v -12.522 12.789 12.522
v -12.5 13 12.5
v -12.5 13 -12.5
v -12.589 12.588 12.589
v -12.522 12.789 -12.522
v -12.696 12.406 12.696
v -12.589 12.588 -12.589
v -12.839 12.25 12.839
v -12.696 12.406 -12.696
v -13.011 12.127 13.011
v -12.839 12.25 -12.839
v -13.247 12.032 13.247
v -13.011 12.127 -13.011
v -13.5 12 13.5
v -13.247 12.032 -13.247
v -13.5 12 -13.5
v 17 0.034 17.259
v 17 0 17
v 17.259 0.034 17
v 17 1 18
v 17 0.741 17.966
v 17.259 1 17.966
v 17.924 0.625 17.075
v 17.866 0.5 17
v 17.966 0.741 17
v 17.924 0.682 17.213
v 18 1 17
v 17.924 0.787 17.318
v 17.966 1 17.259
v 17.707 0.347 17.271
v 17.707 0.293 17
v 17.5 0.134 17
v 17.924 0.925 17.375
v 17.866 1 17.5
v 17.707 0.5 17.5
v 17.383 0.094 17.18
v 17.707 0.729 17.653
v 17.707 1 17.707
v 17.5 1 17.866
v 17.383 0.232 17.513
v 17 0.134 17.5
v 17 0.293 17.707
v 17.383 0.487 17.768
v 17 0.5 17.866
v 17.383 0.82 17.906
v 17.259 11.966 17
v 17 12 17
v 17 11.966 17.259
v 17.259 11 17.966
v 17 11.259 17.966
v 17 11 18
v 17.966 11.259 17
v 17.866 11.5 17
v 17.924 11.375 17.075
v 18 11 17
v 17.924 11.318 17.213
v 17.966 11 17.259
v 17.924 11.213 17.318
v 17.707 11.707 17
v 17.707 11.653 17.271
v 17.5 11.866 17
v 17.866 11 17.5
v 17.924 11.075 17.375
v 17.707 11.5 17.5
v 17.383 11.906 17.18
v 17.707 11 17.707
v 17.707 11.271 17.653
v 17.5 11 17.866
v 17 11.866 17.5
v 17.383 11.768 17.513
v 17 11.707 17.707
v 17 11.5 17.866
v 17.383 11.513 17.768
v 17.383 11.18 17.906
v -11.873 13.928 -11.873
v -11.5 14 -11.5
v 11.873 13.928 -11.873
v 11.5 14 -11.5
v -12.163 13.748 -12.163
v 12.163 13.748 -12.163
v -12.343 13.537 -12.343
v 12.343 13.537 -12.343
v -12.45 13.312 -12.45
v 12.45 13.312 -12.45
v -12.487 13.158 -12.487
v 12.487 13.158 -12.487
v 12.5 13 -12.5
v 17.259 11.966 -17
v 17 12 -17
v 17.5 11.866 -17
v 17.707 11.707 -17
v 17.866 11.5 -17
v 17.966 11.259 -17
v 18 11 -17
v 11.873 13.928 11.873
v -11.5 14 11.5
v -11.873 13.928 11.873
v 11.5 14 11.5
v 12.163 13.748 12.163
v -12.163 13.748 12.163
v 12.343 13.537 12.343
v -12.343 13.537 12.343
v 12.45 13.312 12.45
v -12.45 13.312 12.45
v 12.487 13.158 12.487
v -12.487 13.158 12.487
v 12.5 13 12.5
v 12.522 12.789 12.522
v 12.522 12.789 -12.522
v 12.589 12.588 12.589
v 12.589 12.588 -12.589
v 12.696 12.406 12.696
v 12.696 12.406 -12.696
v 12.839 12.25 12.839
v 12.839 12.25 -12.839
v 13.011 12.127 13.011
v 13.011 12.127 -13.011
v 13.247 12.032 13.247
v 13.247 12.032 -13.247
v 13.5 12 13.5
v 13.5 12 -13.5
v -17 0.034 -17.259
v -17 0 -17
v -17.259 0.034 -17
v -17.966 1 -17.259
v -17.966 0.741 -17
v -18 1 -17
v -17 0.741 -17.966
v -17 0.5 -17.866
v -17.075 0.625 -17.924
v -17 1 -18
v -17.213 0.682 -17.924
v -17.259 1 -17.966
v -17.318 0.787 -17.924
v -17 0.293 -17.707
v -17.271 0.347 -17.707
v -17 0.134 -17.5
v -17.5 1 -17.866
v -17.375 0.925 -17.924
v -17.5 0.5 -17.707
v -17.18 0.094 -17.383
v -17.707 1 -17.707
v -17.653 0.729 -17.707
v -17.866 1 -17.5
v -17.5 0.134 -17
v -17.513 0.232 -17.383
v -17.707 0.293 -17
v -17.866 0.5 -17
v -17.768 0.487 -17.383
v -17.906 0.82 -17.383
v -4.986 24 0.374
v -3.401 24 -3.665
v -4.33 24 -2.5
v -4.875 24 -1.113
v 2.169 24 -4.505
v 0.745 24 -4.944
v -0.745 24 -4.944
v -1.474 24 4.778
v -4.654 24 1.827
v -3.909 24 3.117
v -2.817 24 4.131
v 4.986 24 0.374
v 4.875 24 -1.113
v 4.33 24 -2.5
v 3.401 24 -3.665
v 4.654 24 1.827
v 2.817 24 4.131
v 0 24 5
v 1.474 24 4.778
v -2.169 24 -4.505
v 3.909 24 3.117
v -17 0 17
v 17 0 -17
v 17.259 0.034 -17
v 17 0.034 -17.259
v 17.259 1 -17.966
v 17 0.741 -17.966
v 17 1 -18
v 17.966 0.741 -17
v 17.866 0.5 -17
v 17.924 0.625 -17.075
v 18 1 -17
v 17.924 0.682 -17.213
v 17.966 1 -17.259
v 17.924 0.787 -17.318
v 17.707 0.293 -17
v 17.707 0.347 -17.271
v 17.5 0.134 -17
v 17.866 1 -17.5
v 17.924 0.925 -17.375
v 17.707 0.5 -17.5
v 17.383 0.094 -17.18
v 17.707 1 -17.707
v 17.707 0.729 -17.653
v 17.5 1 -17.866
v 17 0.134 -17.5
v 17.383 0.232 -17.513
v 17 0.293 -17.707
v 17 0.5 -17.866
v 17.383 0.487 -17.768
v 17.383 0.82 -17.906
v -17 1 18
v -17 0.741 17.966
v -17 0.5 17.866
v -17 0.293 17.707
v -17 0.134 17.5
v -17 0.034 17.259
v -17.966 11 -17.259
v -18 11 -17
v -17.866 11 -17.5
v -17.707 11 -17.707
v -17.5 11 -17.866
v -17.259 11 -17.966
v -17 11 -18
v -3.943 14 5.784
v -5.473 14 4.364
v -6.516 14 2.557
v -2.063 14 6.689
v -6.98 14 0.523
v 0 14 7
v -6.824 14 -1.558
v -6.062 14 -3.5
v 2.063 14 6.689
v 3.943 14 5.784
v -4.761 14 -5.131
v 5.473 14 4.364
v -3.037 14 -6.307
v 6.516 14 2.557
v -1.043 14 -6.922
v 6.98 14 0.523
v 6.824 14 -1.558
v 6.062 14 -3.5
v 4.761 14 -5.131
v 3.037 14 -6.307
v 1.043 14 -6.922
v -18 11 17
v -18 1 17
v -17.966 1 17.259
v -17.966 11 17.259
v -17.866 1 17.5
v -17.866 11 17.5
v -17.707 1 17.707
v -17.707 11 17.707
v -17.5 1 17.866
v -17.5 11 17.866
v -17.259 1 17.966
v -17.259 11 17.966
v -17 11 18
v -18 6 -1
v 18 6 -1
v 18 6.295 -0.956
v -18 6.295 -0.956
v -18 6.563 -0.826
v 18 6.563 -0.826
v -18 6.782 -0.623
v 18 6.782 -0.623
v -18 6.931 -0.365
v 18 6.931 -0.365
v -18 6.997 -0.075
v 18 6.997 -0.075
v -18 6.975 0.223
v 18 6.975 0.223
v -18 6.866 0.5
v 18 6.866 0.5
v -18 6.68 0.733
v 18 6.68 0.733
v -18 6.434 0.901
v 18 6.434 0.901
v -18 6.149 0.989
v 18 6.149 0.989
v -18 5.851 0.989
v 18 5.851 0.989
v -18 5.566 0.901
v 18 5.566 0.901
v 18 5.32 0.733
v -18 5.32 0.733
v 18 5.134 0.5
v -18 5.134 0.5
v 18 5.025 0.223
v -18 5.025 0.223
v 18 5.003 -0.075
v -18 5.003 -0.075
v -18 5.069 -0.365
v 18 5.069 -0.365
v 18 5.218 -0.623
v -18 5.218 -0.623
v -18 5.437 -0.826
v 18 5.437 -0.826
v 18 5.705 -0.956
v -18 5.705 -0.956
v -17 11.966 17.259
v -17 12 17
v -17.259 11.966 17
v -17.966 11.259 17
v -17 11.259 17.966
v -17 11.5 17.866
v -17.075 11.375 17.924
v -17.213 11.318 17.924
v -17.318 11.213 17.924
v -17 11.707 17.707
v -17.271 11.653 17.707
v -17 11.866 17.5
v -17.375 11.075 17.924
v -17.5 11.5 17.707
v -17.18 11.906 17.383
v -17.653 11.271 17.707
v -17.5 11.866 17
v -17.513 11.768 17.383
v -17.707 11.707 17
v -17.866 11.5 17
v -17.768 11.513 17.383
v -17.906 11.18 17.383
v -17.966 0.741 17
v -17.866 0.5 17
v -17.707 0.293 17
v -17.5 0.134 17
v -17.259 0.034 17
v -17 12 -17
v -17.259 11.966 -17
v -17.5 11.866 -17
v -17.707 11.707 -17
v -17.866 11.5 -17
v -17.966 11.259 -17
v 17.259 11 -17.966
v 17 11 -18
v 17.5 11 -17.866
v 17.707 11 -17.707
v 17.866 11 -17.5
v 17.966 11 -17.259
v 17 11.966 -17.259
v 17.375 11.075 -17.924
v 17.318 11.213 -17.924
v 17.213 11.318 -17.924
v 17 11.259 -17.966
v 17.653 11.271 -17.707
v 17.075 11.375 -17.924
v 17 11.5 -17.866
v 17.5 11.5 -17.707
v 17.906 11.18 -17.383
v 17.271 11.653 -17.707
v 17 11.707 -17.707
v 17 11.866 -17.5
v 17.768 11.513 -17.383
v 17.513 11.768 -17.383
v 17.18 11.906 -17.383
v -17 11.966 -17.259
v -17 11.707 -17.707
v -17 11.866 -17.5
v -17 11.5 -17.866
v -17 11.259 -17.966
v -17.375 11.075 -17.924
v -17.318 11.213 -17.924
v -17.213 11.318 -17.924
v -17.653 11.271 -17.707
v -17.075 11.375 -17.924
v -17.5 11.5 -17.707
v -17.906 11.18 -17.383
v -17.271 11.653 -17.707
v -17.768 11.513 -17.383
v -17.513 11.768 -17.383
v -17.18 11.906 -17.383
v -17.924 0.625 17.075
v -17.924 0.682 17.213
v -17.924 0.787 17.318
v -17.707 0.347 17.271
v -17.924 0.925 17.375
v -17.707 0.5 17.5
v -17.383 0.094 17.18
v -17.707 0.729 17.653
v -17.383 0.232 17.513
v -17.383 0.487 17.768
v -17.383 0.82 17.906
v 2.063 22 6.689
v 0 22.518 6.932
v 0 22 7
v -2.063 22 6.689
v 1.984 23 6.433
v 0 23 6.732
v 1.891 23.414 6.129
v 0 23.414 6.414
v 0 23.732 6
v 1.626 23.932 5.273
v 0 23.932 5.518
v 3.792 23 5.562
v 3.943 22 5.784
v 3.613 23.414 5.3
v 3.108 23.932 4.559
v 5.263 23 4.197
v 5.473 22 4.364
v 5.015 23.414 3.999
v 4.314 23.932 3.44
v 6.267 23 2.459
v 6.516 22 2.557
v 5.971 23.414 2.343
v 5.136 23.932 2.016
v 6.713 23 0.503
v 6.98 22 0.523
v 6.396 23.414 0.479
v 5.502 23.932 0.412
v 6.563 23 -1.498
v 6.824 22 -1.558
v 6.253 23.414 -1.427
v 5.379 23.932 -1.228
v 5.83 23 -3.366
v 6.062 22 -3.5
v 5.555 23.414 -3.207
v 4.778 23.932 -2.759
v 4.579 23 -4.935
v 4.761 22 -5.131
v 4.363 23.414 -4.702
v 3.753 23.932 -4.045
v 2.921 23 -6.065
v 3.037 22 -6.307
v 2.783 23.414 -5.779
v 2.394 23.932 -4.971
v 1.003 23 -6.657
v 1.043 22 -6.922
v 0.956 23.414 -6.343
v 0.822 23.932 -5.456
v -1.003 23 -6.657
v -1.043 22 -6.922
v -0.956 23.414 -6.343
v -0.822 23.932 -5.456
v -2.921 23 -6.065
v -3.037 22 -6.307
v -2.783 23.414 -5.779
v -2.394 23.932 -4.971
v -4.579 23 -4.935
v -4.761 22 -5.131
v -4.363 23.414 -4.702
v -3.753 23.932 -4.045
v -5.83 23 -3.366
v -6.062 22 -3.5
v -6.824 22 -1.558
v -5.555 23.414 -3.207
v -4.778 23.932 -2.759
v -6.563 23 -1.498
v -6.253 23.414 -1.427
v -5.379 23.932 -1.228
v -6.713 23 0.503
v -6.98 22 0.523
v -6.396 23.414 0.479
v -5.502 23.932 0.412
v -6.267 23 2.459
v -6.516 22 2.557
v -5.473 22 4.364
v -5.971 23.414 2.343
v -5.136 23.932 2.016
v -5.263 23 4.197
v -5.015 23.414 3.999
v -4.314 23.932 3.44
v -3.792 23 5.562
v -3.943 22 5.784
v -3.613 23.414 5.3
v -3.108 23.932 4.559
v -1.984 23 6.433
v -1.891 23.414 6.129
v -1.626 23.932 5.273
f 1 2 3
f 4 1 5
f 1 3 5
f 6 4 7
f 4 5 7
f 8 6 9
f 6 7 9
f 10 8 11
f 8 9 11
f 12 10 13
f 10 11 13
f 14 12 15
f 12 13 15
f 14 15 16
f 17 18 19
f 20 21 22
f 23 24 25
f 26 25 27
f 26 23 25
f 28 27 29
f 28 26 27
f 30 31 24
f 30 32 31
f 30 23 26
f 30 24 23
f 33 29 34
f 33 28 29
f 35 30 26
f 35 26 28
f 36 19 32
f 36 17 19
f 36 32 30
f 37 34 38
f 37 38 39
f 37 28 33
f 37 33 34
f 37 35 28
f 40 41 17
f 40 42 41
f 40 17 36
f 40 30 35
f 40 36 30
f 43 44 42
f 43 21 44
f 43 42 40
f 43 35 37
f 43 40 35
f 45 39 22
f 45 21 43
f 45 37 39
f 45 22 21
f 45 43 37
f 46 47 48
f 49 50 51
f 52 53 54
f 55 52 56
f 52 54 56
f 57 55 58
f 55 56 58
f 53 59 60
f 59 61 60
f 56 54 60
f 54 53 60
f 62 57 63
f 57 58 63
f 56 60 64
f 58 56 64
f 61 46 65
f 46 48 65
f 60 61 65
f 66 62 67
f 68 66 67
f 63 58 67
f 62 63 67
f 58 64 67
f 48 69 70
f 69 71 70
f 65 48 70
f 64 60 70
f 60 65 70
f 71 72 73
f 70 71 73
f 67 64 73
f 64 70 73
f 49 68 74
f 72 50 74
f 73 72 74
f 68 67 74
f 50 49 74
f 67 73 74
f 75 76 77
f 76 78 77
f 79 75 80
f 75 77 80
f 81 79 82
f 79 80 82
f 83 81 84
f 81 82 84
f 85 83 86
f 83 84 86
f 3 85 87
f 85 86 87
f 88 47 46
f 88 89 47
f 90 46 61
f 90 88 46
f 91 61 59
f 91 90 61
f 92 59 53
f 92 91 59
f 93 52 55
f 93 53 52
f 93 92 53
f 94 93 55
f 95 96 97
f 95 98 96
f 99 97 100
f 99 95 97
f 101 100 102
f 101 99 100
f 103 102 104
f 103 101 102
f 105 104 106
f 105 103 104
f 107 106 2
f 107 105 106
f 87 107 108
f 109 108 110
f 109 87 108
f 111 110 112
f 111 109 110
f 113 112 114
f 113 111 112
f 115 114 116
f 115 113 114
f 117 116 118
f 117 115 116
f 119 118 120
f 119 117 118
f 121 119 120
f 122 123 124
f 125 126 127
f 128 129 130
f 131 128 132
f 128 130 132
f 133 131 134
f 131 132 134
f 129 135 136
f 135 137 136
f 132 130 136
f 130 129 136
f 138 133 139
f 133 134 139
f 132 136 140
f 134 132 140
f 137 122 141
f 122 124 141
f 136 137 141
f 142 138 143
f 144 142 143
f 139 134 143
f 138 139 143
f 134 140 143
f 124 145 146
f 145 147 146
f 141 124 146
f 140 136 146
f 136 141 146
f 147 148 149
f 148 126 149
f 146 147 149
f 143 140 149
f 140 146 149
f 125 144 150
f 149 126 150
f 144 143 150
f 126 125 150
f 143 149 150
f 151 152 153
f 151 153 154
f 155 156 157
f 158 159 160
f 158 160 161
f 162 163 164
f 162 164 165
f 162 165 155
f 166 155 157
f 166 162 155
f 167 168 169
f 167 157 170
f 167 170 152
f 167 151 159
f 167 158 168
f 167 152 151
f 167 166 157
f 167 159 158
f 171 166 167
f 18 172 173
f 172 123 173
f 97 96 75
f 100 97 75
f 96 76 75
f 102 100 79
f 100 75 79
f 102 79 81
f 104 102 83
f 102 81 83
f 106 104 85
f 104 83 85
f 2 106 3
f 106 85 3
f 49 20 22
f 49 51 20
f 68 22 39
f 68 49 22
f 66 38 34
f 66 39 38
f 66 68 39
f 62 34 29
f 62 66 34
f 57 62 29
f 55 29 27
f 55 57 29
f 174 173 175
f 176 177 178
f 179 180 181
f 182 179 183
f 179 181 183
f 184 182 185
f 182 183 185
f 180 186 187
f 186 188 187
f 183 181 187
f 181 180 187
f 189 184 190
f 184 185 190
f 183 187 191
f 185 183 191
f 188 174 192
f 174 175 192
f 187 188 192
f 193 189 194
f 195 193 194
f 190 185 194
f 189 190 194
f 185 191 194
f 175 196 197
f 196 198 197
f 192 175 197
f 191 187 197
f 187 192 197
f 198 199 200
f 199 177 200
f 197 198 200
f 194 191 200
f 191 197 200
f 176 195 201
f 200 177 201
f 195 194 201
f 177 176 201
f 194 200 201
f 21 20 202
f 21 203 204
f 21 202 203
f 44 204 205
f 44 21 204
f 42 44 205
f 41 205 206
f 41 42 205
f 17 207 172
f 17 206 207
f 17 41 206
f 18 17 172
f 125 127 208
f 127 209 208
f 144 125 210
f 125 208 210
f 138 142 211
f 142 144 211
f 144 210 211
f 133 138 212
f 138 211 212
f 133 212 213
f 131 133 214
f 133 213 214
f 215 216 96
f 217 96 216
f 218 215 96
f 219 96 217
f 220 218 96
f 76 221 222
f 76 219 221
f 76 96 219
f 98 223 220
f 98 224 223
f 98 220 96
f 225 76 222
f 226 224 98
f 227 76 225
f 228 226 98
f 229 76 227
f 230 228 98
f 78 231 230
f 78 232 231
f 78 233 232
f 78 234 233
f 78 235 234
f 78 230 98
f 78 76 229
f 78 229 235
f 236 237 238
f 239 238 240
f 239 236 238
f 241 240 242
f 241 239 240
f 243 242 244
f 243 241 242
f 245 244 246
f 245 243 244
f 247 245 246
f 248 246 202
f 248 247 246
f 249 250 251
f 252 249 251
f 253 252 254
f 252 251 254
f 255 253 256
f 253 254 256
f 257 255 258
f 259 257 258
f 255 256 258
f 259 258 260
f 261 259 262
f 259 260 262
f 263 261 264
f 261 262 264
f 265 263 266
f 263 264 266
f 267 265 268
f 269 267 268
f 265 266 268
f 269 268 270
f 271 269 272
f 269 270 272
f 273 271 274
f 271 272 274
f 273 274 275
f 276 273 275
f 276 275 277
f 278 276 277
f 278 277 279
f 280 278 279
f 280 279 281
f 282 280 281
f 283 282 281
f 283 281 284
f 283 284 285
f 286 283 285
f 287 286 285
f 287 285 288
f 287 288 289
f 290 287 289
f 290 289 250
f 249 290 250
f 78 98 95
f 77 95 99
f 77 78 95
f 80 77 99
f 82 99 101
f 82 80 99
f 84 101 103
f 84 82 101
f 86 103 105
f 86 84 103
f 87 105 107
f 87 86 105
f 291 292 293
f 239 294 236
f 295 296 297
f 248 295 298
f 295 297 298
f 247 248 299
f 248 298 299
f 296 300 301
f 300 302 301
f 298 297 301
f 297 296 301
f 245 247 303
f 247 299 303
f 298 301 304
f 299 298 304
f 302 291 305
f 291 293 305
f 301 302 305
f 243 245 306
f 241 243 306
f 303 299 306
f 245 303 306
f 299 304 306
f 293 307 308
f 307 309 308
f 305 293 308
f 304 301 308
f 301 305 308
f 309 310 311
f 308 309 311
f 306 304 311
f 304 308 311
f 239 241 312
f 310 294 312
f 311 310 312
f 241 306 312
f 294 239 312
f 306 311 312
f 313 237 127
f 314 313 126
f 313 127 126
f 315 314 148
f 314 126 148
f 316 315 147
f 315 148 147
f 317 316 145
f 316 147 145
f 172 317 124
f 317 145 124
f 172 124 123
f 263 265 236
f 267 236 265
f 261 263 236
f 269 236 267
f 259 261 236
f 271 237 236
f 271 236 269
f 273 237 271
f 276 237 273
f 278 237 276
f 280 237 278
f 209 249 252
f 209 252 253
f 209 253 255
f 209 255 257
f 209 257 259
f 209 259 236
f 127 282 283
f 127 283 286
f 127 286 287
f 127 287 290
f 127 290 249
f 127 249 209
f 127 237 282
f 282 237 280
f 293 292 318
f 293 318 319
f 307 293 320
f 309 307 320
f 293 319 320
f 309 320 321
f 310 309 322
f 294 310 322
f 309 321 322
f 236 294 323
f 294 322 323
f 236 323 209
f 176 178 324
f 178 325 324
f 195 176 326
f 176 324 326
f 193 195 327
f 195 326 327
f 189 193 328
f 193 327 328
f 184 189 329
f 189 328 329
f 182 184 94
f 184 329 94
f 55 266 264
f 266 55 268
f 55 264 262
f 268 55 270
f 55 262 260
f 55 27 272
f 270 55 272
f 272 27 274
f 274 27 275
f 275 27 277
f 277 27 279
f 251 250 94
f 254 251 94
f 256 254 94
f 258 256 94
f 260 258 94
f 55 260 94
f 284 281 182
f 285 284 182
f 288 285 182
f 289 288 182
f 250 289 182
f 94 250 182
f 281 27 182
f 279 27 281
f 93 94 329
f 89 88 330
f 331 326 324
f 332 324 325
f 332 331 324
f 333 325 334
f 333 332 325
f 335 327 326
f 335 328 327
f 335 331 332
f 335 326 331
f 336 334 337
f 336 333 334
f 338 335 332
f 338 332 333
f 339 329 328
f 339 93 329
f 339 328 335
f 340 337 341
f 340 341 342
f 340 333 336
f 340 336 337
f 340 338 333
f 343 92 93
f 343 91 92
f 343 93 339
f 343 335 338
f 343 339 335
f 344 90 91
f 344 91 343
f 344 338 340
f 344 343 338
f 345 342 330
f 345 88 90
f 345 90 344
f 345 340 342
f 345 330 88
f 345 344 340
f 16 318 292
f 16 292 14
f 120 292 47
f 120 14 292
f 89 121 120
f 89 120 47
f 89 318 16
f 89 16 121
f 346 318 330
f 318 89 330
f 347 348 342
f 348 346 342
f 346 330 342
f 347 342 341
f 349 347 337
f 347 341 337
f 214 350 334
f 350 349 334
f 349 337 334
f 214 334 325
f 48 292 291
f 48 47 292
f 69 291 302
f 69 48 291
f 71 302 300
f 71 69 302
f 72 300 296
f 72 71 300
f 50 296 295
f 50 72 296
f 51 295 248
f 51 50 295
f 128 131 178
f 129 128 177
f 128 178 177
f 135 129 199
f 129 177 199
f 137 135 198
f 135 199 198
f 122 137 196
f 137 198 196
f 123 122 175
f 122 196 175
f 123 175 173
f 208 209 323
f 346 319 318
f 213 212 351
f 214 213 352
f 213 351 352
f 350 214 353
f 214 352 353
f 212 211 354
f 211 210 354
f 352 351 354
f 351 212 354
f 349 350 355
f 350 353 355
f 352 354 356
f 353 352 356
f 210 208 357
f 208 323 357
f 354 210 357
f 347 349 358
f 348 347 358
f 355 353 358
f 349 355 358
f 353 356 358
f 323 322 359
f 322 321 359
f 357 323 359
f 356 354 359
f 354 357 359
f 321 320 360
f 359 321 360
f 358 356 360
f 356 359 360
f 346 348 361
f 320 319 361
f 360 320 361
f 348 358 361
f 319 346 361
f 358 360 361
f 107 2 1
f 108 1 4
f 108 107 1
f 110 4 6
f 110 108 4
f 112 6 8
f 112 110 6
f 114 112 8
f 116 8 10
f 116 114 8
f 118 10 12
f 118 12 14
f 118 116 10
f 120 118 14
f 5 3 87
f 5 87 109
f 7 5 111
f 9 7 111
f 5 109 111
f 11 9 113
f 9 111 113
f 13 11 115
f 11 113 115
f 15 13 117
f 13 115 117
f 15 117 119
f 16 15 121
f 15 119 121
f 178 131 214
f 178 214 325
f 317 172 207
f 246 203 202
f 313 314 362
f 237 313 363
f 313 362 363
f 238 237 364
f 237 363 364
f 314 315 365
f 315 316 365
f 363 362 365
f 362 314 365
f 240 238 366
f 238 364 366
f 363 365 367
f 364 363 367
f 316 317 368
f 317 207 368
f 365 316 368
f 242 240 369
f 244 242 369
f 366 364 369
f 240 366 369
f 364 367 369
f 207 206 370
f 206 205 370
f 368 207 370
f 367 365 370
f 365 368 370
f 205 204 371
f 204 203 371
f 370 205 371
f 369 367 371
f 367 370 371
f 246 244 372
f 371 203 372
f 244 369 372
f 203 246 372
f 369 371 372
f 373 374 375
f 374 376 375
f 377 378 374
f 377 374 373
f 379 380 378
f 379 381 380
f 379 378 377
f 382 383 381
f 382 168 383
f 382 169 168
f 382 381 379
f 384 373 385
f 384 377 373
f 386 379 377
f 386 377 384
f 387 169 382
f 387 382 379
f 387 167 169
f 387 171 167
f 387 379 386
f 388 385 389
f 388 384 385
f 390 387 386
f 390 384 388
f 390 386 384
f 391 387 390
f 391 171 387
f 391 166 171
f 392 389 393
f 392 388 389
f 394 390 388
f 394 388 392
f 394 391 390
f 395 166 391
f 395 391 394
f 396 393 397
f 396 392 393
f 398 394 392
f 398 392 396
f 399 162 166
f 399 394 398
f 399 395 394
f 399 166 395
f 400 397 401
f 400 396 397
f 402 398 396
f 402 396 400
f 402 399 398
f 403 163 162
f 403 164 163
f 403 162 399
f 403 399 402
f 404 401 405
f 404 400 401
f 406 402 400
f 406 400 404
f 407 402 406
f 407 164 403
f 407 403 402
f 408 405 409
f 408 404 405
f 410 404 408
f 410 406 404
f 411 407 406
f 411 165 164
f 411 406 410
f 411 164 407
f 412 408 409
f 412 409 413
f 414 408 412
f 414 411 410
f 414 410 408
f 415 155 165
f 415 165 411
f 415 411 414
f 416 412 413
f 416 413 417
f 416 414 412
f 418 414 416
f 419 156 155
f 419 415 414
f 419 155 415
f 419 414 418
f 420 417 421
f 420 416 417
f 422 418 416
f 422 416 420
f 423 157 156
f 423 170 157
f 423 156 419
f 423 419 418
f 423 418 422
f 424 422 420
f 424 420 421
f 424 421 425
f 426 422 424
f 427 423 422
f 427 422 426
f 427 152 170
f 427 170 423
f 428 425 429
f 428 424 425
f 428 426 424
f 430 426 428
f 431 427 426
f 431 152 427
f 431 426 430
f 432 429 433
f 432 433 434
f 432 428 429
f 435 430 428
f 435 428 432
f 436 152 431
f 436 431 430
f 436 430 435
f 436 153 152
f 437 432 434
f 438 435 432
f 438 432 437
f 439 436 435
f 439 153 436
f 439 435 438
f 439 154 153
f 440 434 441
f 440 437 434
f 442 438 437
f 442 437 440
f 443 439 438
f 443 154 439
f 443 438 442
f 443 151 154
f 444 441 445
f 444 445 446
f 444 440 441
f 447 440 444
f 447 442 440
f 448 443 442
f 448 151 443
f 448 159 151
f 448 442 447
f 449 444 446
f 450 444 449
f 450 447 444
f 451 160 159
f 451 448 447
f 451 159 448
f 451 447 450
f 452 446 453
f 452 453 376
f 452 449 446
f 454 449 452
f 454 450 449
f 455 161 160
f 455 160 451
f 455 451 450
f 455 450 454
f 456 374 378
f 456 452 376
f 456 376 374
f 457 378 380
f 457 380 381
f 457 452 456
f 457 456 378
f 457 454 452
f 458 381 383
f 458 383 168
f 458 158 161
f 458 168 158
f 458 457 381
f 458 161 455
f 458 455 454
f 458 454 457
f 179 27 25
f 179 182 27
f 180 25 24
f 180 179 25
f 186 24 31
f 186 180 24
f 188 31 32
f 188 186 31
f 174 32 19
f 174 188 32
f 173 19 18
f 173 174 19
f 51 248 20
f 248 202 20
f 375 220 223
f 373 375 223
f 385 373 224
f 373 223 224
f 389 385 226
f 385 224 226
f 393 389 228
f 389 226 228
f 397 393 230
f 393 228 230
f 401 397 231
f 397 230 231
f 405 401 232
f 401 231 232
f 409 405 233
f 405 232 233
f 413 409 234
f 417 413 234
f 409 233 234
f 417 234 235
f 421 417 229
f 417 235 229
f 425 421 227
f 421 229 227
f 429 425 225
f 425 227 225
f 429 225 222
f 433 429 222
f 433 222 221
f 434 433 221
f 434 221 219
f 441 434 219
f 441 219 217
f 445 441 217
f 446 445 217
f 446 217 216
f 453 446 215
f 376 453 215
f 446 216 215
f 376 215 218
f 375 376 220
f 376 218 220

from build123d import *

# Parameters (mm, degrees)
SKETCH_1_W          = 36
SKETCH_1_H          = 36
EXTRUDE_1_DEPTH     = 12
SKETCH_2_W          = 25
SKETCH_2_H          = 25
EXTRUDE_2_DEPTH     = 2
SKETCH_3_R          = 7
EXTRUDE_3_DEPTH     = 10
FILLET_1_R          = 2
FILLET_2_R          = 1
FILLET_3_R          = 1
SKETCH_4_R          = 1
CUT_EXTRUDE_1_DEPTH = 50


with BuildPart() as part:
    # 草图1 → 凸台-拉伸1 (new body)
    with BuildSketch(Plane(origin=(0, 0, 0), x_dir=(1, 0, 0), z_dir=(0, 1, 0))):
        Rectangle(SKETCH_1_W, SKETCH_1_H)
    extrude(amount=EXTRUDE_1_DEPTH)

    # 草图2 → 凸台-拉伸2 (add)
    with BuildSketch(Plane(origin=(0, 12, 0), x_dir=(1, 0, 0), z_dir=(0, 1, 0))):
        Rectangle(SKETCH_2_W, SKETCH_2_H)
    extrude(amount=EXTRUDE_2_DEPTH)

    # 草图3 → 凸台-拉伸3 (add)
    with BuildSketch(Plane(origin=(0, 14, 0), x_dir=(1, 0, 0), z_dir=(0, 1, 0))):
        with Locations(Location((0, 0, 0), (0, 0, 270))):
            Circle(SKETCH_3_R)
    extrude(amount=EXTRUDE_3_DEPTH)

    # 圆角1
    fillet_1_edges = [part.edges().sort_by_distance(p)[0] for p in [
        (0, 24, -7),
    ]]
    fillet(fillet_1_edges, radius=FILLET_1_R)

    # 圆角2
    fillet_2_edges = [part.edges().sort_by_distance(p)[0] for p in [
        (0, 12, -12.5),
        (12.5, 12, 0),
        (0, 12, 12.5),
        (-12.5, 14, 0),
        (-12.5, 12, 0),
        (0, 14, 12.5),
        (12.5, 14, 0),
        (0, 14, -12.5),
    ]]
    fillet(fillet_2_edges, radius=FILLET_2_R - 0.0001)  # a hair under: the kernel refuses the full size

    # 圆角3
    fillet_3_edges = [part.edges().sort_by_distance(p)[0] for p in [
        (-18, 12, 0),
        (0, 12, 18),
        (18, 12, 0),
        (0, 0, 18),
        (-18, 0, 0),
        (0, 0, -18),
        (18, 0, 0),
        (18, 6, 18),
        (-18, 6, 18),
        (-18, 6, -18),
        (18, 6, -18),
        (0, 12, -18),
    ]]
    fillet(fillet_3_edges, radius=FILLET_3_R)

    # 草图4 → 切除-拉伸1 (cut)
    with BuildSketch(Plane(origin=(18, 0, 0), x_dir=(0, 0, -1), z_dir=(1, 0, 0))):
        with Locations((0, 6)):
            Circle(SKETCH_4_R)
    extrude(amount=-CUT_EXTRUDE_1_DEPTH, mode=Mode.SUBTRACT)


solid = part.part
